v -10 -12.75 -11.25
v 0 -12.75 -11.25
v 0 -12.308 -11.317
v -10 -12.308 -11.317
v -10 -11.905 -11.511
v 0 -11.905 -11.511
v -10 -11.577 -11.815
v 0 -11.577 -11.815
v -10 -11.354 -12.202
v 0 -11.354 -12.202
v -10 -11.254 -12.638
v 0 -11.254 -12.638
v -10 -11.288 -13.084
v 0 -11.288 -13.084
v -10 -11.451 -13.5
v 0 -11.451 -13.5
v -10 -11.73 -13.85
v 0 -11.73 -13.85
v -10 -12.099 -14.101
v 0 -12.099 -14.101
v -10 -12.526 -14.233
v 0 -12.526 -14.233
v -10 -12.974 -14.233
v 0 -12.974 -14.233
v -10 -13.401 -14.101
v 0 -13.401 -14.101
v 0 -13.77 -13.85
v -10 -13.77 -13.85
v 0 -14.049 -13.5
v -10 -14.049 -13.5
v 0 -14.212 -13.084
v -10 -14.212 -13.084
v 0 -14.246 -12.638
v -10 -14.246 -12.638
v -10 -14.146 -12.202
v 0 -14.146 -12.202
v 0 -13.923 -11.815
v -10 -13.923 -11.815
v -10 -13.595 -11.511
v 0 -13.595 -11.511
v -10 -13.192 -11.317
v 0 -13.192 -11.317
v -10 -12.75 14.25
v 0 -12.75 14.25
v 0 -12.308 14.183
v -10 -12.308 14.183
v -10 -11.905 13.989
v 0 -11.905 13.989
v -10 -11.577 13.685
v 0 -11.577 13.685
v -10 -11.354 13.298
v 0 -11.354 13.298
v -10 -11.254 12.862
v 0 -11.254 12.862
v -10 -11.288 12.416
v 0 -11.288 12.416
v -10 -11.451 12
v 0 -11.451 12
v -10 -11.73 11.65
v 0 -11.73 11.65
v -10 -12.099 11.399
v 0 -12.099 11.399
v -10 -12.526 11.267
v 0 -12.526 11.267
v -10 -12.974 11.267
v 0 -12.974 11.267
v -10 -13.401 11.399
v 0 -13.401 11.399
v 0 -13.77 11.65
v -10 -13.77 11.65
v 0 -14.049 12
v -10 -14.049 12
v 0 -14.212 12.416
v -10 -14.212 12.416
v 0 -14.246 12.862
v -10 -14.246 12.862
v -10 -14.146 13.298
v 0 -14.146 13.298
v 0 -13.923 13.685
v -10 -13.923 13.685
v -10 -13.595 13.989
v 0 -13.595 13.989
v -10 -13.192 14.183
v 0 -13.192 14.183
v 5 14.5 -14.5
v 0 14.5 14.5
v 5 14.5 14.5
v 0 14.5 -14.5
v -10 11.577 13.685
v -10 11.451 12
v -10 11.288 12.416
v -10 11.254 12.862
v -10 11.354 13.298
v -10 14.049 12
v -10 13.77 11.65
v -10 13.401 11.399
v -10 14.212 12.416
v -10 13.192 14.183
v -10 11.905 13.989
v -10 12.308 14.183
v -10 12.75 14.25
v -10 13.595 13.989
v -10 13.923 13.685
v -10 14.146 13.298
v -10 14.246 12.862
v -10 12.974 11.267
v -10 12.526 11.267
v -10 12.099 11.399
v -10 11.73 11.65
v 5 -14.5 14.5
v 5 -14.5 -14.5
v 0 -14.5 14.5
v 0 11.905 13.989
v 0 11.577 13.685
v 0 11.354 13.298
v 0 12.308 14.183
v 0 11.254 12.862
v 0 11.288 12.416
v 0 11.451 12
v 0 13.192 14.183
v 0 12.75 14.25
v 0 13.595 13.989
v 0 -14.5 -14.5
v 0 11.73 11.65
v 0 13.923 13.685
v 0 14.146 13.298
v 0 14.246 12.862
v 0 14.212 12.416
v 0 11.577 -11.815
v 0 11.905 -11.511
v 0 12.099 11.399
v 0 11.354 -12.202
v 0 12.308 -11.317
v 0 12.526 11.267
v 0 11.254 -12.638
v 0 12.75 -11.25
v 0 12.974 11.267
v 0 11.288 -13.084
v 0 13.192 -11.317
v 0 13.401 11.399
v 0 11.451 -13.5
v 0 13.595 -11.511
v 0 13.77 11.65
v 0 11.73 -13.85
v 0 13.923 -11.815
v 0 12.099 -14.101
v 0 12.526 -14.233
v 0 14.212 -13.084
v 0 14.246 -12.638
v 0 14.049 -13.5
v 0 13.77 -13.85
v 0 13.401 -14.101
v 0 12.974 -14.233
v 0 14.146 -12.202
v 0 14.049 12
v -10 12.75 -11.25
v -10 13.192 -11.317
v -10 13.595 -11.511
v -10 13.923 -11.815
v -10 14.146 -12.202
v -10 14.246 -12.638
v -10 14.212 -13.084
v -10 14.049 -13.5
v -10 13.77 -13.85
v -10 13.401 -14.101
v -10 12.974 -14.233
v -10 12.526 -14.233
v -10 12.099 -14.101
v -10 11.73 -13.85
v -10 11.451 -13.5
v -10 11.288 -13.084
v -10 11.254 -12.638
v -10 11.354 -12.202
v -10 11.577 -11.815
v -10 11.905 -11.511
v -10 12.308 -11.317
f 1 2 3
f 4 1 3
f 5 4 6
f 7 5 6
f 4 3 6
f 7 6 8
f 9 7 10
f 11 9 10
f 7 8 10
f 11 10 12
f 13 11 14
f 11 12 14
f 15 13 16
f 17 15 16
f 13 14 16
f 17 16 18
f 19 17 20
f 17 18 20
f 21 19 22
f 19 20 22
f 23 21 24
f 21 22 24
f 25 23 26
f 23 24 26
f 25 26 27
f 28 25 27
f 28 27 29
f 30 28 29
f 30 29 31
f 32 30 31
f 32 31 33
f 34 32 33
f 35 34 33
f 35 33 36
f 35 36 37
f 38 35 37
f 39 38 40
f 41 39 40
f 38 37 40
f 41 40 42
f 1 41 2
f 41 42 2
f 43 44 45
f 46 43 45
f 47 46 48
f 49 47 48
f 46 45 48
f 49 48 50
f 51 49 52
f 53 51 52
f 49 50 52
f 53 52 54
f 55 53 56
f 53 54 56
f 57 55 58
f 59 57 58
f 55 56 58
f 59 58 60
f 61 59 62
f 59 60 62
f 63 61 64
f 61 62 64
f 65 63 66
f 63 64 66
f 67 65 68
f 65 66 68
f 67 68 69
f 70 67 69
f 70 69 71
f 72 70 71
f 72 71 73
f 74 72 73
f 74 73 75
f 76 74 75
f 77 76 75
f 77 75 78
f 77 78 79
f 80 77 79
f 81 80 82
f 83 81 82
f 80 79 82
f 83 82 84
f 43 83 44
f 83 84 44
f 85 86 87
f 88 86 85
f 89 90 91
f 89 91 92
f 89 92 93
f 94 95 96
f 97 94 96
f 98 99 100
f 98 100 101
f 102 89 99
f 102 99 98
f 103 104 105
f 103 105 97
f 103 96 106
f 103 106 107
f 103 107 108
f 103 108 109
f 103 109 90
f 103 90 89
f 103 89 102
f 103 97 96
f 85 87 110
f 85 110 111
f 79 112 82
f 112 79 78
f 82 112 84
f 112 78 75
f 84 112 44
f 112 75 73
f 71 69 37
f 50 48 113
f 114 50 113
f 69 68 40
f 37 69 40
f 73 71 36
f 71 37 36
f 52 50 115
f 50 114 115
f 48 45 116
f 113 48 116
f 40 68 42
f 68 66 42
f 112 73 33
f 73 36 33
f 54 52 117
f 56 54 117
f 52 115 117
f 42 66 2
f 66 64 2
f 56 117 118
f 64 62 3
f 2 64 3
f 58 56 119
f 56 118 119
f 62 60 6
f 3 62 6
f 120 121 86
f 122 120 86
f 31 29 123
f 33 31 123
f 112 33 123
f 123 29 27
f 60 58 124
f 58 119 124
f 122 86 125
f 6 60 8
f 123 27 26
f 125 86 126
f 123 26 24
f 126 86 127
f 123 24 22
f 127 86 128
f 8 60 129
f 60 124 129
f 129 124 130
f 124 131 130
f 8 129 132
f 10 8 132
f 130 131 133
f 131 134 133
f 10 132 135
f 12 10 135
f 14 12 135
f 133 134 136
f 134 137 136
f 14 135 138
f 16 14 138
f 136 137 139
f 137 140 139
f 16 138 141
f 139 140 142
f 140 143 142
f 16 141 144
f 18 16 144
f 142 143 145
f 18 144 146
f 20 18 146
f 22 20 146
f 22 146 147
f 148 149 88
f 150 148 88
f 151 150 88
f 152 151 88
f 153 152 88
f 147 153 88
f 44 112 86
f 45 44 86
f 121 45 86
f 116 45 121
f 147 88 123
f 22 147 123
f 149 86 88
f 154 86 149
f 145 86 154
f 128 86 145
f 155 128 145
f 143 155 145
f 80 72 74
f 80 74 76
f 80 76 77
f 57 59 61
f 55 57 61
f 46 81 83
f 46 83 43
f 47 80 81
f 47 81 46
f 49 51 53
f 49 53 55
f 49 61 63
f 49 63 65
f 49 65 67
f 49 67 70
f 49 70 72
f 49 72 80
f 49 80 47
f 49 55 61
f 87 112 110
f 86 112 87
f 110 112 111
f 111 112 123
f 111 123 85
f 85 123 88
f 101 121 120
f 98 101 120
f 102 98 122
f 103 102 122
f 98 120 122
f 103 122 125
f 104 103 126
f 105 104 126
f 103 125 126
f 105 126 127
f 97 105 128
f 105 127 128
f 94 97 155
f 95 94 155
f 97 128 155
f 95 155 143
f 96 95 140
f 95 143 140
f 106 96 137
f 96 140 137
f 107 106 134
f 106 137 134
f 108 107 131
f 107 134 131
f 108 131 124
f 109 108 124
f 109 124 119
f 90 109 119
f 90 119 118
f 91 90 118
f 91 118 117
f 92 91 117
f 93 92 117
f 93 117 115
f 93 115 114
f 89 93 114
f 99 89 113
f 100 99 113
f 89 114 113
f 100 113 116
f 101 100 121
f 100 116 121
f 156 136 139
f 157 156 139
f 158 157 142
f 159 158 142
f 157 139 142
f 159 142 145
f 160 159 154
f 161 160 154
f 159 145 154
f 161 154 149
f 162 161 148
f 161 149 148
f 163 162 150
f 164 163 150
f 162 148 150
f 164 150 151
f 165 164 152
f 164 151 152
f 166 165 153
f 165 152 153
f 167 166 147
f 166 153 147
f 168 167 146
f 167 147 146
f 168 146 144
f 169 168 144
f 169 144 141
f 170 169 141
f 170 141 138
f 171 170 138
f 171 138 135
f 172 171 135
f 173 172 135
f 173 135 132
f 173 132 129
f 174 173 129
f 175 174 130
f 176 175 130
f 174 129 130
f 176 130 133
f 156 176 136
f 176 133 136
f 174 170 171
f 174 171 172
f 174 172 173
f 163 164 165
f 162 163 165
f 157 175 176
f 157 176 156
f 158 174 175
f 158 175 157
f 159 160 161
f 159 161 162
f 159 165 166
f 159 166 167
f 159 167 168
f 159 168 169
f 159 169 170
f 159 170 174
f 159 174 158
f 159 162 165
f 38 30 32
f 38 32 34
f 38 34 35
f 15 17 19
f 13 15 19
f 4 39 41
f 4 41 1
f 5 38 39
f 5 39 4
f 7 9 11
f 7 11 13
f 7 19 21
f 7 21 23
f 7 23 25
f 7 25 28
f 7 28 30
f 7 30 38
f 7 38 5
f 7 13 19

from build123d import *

# Parameters (mm, degrees)
SKETCH1_W           = 29
SKETCH1_H           = 29
BOSS_EXTRUDE1_DEPTH = 5
SKETCH2_R           = 1.5
BOSS_EXTRUDE2_DEPTH = 10


with BuildPart() as part:
    # Sketch1 → Boss-Extrude1 (new body)
    with BuildSketch(Plane(origin=(0, 0, 0), x_dir=(0, 0, -1), z_dir=(1, 0, 0))):
        Rectangle(SKETCH1_W, SKETCH1_H)
    extrude(amount=BOSS_EXTRUDE1_DEPTH)

    # Sketch2 → Boss-Extrude2 (add)
    with BuildSketch(Plane.ZY):
        with Locations((-12.75, 12.75)):
            Circle(SKETCH2_R)
        with Locations((12.75, 12.75)):
            Circle(SKETCH2_R)
        with Locations((12.75, -12.75)):
            Circle(SKETCH2_R)
        with Locations((-12.75, -12.75)):
            Circle(SKETCH2_R)
    extrude(amount=BOSS_EXTRUDE2_DEPTH)


solid = part.part
